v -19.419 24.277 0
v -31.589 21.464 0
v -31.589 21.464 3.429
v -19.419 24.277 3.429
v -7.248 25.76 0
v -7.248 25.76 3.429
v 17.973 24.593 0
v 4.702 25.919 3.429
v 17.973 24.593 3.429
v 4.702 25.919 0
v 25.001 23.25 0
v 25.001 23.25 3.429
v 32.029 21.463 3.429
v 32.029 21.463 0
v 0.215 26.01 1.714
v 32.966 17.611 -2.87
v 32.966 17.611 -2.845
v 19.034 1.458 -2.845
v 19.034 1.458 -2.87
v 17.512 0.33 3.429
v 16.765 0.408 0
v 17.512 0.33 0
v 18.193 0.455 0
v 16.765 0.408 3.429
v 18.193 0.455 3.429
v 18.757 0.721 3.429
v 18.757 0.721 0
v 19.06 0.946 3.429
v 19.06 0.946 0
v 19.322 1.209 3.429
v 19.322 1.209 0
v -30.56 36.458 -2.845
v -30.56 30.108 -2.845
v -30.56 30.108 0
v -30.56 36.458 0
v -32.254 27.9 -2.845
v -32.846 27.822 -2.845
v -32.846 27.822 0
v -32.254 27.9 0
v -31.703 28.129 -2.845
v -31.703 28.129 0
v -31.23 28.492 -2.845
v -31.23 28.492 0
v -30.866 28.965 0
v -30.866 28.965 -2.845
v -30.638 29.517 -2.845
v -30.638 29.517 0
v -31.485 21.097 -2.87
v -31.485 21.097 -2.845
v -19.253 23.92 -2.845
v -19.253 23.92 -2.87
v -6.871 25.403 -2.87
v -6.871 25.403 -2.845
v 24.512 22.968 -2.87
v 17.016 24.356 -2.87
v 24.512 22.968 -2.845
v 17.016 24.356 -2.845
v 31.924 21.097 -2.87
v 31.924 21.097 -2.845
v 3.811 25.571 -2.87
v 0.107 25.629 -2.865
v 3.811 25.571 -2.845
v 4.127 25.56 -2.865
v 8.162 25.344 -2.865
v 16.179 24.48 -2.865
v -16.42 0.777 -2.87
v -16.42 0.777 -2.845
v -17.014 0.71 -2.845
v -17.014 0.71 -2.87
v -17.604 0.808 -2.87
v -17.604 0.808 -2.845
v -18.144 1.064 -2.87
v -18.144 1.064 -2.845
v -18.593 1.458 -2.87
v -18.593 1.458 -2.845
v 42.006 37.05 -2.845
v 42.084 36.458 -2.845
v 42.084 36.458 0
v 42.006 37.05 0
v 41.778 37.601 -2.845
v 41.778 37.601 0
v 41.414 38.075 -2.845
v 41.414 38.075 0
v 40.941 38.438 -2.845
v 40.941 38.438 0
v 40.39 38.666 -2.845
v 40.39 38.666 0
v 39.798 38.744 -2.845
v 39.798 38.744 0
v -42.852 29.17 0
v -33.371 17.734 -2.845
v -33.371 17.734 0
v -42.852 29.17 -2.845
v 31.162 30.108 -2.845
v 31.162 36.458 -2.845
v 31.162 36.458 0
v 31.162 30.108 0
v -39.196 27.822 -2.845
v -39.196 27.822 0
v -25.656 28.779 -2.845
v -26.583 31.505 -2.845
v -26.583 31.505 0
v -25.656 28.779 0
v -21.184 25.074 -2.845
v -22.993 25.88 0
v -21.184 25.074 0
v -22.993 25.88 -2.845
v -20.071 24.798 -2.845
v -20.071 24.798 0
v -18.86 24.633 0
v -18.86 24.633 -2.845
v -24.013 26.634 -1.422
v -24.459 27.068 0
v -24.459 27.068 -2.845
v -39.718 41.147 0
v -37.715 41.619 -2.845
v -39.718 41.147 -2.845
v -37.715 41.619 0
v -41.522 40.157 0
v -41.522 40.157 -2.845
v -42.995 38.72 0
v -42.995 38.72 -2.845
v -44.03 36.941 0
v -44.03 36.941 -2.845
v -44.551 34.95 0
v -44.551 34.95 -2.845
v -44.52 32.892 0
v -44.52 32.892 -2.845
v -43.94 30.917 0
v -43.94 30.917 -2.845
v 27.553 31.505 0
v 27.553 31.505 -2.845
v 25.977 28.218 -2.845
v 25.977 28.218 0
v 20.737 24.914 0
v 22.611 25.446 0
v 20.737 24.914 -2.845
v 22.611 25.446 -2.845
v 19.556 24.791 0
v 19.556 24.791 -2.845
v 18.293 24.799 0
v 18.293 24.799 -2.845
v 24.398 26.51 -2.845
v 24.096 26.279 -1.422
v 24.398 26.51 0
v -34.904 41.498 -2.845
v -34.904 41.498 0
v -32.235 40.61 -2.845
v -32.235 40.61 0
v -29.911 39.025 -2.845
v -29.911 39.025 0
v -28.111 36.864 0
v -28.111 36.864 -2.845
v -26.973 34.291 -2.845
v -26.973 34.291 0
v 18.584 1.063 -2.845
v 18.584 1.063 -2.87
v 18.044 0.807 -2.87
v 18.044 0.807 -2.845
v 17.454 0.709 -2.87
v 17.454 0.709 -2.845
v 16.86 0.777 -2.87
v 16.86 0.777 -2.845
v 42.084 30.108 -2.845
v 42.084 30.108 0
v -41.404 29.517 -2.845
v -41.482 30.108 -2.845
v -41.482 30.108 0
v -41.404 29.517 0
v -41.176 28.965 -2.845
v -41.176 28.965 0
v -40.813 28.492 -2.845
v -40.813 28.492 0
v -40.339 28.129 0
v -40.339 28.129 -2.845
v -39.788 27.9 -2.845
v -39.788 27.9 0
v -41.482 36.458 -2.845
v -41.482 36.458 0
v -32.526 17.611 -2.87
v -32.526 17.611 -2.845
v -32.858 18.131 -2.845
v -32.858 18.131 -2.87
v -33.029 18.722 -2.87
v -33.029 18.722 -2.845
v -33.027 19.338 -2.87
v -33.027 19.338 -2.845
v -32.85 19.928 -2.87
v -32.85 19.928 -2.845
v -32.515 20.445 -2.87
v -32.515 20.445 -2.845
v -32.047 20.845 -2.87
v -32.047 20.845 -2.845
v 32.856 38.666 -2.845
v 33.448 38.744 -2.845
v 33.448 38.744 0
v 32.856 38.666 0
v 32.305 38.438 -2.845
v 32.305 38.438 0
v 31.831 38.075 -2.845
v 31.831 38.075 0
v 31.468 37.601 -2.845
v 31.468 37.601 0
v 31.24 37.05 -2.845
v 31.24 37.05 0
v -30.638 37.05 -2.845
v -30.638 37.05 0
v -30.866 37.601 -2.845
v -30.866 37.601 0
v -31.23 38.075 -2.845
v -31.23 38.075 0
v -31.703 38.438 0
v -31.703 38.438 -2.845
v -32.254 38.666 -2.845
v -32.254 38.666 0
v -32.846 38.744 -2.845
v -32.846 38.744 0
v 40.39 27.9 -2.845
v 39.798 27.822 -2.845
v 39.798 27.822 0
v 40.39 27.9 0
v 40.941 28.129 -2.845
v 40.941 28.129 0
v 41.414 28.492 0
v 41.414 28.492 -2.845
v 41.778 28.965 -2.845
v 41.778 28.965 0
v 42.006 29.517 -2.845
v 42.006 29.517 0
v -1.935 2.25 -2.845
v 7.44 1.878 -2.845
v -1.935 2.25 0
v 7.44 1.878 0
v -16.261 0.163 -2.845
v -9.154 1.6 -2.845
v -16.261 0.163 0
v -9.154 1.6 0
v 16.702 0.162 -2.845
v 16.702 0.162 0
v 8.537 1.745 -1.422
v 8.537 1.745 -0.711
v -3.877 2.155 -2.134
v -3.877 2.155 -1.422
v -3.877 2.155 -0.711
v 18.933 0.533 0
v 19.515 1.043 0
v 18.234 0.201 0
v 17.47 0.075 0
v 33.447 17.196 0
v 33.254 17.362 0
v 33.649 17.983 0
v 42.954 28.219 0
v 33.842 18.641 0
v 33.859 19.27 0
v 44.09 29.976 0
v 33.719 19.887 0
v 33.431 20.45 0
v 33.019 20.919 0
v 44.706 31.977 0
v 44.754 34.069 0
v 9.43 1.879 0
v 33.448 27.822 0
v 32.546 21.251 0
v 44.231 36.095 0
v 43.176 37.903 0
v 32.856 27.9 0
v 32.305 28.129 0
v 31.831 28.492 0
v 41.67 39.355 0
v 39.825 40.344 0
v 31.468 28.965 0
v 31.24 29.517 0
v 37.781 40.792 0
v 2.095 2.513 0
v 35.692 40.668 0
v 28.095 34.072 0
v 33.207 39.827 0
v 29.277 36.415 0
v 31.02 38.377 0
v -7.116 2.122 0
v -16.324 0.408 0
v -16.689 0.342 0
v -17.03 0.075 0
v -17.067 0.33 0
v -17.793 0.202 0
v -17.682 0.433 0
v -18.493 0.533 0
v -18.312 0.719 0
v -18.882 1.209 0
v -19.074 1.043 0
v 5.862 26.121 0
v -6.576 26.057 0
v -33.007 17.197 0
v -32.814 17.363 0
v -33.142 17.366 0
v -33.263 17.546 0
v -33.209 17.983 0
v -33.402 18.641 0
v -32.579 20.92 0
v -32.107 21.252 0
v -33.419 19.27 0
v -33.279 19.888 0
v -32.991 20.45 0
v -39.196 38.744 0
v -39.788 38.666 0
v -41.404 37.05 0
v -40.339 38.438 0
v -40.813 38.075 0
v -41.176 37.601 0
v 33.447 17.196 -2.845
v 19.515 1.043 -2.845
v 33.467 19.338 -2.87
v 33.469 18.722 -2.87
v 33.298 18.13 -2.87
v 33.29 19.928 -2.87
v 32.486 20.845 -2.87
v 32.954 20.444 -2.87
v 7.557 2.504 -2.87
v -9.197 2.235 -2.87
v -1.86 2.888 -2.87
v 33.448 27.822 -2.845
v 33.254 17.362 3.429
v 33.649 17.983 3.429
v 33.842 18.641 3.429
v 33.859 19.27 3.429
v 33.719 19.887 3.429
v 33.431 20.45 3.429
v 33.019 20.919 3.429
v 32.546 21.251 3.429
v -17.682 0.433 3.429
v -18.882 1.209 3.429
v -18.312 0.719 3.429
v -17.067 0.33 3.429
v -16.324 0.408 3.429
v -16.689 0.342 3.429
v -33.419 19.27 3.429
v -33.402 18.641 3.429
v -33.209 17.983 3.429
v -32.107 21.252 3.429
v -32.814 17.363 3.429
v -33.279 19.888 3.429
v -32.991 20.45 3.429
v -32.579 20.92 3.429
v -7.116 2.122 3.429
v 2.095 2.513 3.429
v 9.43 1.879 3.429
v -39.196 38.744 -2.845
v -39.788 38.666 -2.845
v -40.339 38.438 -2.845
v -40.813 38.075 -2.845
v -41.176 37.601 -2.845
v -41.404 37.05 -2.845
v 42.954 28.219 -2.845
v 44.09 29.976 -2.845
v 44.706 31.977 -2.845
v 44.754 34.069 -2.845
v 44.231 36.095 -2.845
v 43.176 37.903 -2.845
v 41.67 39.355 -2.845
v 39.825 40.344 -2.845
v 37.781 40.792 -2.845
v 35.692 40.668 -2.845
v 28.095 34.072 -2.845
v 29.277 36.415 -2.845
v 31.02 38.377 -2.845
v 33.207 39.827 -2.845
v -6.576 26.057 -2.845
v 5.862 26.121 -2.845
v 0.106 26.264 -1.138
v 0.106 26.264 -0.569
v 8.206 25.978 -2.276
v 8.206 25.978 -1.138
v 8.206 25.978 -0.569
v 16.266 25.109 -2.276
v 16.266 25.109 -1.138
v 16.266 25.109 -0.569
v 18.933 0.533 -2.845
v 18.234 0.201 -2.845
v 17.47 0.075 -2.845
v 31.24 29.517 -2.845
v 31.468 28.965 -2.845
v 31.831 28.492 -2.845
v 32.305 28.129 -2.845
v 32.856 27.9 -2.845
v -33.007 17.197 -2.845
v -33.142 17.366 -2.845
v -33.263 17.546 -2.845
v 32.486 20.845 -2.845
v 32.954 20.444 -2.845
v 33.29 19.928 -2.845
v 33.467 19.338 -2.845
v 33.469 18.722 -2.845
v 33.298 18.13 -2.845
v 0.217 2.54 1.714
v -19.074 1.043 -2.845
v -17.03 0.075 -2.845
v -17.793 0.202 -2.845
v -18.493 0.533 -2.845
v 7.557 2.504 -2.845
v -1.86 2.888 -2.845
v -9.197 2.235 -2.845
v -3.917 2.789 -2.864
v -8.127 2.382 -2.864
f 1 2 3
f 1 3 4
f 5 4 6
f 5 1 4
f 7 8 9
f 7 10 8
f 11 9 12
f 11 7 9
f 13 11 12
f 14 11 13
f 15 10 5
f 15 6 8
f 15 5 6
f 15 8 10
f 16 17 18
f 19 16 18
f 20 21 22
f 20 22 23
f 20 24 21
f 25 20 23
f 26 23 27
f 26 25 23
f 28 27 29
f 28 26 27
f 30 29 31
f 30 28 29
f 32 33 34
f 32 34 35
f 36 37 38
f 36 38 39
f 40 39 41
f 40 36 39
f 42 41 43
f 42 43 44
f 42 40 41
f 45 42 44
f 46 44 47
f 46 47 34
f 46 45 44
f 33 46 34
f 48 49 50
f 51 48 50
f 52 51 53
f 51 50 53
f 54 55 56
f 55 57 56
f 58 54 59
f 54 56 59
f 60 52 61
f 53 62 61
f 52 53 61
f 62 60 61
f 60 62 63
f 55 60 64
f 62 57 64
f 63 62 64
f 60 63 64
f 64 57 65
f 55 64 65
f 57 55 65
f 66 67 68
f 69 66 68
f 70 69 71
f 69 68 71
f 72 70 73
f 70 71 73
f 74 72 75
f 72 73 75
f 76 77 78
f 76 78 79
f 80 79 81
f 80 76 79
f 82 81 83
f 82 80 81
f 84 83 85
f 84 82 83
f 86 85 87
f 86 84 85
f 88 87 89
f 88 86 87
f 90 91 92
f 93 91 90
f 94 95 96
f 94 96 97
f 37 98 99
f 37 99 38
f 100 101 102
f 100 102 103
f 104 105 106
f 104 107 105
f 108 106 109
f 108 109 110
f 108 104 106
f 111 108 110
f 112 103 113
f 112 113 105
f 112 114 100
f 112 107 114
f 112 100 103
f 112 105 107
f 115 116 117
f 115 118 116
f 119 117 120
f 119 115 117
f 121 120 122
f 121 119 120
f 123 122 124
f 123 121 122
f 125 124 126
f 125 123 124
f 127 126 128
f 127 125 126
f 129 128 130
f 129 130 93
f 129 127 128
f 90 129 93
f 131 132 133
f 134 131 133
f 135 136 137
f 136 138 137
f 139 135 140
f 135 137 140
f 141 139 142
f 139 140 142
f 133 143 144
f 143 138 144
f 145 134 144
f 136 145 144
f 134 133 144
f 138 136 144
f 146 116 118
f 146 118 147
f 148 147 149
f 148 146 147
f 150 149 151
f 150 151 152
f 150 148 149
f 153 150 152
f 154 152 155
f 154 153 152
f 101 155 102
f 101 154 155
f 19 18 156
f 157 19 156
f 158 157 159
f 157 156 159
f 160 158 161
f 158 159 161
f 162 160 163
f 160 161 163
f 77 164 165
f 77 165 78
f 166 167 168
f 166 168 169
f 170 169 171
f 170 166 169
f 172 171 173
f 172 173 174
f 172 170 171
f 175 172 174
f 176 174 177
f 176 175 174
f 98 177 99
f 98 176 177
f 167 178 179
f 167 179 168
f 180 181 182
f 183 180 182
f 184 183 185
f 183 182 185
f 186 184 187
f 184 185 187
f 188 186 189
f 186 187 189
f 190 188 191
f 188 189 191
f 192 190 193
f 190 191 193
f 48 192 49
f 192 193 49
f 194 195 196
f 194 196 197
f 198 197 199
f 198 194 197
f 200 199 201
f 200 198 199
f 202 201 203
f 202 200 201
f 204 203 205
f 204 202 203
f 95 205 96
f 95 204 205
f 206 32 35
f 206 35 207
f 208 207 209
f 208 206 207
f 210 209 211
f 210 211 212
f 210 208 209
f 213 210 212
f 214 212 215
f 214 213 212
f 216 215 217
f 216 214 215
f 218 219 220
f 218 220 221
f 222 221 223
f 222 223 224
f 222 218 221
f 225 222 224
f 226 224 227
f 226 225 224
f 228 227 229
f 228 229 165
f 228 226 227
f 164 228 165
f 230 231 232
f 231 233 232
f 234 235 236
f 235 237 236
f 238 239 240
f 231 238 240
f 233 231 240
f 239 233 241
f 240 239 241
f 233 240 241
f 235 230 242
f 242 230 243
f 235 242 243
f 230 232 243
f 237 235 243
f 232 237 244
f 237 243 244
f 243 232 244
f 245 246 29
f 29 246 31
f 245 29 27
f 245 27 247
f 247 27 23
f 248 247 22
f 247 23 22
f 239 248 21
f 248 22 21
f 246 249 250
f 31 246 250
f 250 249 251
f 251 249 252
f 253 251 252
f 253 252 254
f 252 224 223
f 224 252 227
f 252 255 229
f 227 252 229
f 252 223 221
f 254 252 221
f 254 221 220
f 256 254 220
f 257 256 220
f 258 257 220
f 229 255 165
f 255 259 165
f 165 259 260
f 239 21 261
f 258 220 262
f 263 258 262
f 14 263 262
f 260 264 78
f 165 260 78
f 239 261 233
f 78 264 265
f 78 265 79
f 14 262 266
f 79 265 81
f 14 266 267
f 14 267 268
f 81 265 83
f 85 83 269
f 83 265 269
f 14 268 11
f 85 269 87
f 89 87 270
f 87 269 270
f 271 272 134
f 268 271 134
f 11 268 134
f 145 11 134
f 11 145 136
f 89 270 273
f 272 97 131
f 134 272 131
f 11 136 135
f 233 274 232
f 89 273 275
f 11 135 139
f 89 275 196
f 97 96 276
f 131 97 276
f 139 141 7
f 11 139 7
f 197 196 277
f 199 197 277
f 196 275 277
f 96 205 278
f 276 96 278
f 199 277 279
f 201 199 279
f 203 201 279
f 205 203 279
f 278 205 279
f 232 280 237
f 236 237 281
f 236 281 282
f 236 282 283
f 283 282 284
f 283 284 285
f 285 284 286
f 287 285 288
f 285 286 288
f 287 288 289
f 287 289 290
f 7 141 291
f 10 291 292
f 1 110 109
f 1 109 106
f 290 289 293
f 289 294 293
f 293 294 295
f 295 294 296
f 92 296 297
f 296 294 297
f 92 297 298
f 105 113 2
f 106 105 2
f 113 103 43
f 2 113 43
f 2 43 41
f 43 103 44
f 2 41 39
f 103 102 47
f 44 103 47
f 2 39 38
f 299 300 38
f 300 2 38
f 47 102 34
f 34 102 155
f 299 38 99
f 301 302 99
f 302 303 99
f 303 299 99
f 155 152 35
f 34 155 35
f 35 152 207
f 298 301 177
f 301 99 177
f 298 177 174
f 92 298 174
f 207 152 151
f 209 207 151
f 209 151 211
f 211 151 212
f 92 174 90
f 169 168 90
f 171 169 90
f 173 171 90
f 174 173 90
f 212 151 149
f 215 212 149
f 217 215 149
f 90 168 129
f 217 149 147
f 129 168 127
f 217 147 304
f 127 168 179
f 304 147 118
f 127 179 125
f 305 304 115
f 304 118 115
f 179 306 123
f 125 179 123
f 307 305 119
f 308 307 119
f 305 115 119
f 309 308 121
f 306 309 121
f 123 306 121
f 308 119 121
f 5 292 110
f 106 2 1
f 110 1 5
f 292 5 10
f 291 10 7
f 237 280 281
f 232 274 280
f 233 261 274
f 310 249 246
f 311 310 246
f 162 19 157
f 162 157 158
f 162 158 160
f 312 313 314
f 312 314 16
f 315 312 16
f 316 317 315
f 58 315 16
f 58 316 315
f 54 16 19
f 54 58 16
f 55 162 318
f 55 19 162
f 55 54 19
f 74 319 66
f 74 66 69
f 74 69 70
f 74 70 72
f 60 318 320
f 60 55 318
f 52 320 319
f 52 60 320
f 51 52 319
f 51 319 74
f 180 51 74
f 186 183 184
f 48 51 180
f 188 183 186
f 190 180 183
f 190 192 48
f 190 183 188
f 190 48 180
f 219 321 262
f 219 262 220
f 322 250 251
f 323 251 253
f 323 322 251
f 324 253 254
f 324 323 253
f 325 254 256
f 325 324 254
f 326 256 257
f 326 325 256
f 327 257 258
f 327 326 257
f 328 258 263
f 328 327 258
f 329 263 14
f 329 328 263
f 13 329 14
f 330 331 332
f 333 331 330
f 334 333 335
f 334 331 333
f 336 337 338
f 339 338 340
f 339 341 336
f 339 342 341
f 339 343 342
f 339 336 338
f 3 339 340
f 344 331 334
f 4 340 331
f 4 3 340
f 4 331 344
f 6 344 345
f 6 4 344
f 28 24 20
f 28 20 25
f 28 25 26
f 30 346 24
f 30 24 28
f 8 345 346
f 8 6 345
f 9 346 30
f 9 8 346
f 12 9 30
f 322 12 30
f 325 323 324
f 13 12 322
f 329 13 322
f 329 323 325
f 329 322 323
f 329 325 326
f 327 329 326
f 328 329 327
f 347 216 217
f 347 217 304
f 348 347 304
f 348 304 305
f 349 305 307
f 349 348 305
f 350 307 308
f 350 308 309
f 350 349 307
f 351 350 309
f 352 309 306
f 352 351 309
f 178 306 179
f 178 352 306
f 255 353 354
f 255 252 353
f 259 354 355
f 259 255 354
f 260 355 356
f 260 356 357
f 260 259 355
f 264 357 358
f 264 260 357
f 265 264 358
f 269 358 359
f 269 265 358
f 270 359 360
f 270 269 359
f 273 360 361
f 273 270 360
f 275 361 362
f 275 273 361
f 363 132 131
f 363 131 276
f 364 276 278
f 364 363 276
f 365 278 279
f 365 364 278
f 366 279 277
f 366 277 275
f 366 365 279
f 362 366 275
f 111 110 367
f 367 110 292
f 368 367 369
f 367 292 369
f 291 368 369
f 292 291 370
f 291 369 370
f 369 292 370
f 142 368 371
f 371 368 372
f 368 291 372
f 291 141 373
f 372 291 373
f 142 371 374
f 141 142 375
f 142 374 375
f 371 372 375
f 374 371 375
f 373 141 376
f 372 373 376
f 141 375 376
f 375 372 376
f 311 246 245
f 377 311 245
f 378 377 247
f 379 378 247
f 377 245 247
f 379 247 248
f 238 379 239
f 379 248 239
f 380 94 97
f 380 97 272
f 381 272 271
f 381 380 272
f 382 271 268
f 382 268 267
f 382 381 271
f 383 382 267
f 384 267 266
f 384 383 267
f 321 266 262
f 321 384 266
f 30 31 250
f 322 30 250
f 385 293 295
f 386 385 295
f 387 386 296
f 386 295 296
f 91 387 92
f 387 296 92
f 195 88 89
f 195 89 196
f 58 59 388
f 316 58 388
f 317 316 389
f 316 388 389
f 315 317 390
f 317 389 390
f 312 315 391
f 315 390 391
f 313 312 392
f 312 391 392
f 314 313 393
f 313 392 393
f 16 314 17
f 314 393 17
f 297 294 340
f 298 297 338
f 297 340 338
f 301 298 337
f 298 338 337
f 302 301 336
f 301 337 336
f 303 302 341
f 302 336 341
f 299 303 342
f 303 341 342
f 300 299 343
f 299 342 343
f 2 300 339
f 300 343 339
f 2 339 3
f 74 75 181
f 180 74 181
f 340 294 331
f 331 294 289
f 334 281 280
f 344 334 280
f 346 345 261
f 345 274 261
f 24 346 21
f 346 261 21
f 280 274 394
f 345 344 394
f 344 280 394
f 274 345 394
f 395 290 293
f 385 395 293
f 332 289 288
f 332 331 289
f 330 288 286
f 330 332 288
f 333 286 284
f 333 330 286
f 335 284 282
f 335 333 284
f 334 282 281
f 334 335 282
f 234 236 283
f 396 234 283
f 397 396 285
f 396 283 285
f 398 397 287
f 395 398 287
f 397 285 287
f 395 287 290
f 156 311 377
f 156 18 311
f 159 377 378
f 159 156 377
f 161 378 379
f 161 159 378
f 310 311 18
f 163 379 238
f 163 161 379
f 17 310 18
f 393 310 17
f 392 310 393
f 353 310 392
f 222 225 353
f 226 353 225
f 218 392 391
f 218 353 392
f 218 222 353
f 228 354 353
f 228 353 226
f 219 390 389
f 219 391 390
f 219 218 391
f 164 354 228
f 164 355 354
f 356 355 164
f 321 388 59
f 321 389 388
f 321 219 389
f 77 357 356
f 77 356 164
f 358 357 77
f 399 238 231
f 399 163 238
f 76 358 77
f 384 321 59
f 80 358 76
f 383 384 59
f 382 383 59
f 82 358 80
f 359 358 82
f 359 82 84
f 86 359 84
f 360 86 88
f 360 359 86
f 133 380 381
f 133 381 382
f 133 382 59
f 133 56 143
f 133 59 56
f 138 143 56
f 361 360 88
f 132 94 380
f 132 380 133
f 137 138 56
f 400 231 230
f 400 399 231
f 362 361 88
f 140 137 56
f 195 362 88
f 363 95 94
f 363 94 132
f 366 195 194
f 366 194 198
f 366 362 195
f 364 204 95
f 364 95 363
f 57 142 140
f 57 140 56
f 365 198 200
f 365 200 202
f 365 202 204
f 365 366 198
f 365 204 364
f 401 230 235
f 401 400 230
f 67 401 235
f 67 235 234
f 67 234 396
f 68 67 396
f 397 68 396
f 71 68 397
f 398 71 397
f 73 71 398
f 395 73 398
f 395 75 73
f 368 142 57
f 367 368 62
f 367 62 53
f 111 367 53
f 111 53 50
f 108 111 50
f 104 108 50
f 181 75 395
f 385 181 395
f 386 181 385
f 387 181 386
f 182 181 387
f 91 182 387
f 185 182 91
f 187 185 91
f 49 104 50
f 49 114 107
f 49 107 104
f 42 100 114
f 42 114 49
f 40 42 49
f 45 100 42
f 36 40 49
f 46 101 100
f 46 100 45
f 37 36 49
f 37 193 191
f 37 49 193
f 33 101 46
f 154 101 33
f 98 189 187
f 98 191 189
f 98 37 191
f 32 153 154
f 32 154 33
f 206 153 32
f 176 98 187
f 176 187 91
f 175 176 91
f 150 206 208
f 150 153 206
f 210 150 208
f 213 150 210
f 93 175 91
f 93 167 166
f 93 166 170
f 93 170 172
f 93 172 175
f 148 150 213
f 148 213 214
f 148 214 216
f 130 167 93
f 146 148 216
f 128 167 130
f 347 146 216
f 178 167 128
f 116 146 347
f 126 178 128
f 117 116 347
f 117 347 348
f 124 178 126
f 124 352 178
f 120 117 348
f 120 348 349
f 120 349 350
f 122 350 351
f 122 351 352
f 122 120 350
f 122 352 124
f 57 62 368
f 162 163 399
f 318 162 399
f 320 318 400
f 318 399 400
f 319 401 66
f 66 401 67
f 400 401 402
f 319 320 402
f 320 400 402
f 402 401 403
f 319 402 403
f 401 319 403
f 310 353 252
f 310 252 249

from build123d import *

# Parameters (mm, degrees)
BOSS_EXTRUDE1_DEPTH = 3.429
FILLET1_R           = 2.54
BOSS_EXTRUDE2_DEPTH = 2.8448
BOSS_EXTRUDE3_DEPTH = 2.8448
FILLET2_R           = 7.62
CUT_EXTRUDE1_DEPTH  = 2.8448
BOSS_EXTRUDE4_DEPTH = 2.8448
CUT_EXTRUDE2_DEPTH  = 2.8448
FILLET3_R           = 7.62
BOSS_EXTRUDE5_DEPTH = 0.0254


with BuildPart() as part:
    # Sketch1 → Boss-Extrude1 (new body)
    with BuildSketch(Plane.XY):
        with BuildLine():
            Line((-35.365163415, 20.32), (-17.839163415, 0))
            add(Edge.make_bspline(
                [(-17.839163415, 0), (0.211689908, 5.080726576), (18.279636585, 0)],
                knots=[0, 0, 0, 1, 1, 1], degree=2))
            Line((18.279636585, 0), (35.805636585, 20.32))
            add(Edge.make_bspline(
                [(-35.365163415, 20.32), (0.209256434, 31.699614416), (35.805636585, 20.32)],
                knots=[0, 0, 0, 1, 1, 1], degree=2))
        make_face()
    extrude(amount=BOSS_EXTRUDE1_DEPTH)

    # Fillet1
    fillet1_edges = [part.edges().sort_by_distance(p)[0] for p in [
        (18.279636585, 0, 1.7145),
        (35.805636585, 20.32, 1.7145),
        (-17.839163415, 0, 1.7145),
        (-35.365163415, 20.32, 1.7145),
    ]]
    fillet(fillet1_edges, radius=FILLET1_R)

    # Sketch3 → Boss-Extrude2 (add)
    with BuildSketch(Plane(origin=(0, 0, 0), x_dir=(-1, 0, 0), z_dir=(0, 0, -1))):
        with BuildLine():
            Line((-33.44681638, 17.196237572), (-19.51455408, 1.042889978))
            ThreePointArc((-19.51455408, 1.042889978), (-18.233735028, 0.201395136), (-16.701721503, 0.162081334))
            add(Edge.make_bspline(
                [(-16.701721503, 0.162081334), (-11.287416328, 1.557018557), (-5.815998288, 2.280480011), (1.099570731, 2.287789464), (2.486501294, 2.244377729), (5.268126494, 2.066272068), (6.66342146, 1.931190975), (10.814897092, 1.394504939), (13.552184291, 0.860935066), (16.260993662, 0.162500978)],
                knots=[0, 0, 0, 0, 0.5, 0.5, 0.625, 0.625, 0.75, 0.75, 1, 1, 1, 1], degree=3))
            ThreePointArc((16.260993662, 0.162500978), (17.793263077, 0.201606931), (19.074330708, 1.043179601))
            Line((19.074330708, 1.043179601), (33.006779663, 17.196743606))
            ThreePointArc((33.006779663, 17.196743606), (33.568121111, 19.821332934), (31.659110958, 21.707931354))
            add(Edge.make_bspline(
                [(31.659110958, 21.707931354), (21.234977833, 24.688407586), (10.651761037, 26.253278411), (-1.450873571, 26.265063816), (-2.798343422, 26.242056629), (-5.498815234, 26.146814801), (-6.854115547, 26.074394022), (-10.909317669, 25.783877715), (-13.59595314, 25.493149433), (-21.607199162, 24.340406402), (-26.883182271, 23.198023422), (-32.098788298, 21.707528048)],
                knots=[0, 0, 0, 0, 0.5, 0.5, 0.5625, 0.5625, 0.625, 0.625, 0.75, 0.75, 1, 1, 1, 1], degree=3))
            ThreePointArc((-32.098788298, 21.707528048), (-34.008104328, 19.821005964), (-33.44681638, 17.196237572))
        make_face()
    extrude(amount=BOSS_EXTRUDE2_DEPTH)

    # Sketch6 → Boss-Extrude3 (add)
    with BuildSketch(Plane(origin=(0, 0, -2.8448), x_dir=(-1, 0, 0), z_dir=(0, 0, -1))):
        with BuildLine():
            Line((18.860011299, 24.632736939), (22.773121111, 23.894535093))
            Line((22.773121111, 23.894535093), (30.902144608, 14.756587021))
            Line((30.902144608, 14.756587021), (46.651415509, 33.752843138))
            ThreePointArc((46.651415509, 33.752843138), (35.612340647, 41.602210449), (26.583121111, 31.505332934))
            add(Edge.make_bspline(
                [(26.583121111, 31.505332934), (25.303985062, 25.198624265), (18.860011299, 24.632736939)],
                knots=[0, 0, 0, 1, 1, 1], degree=2))
        make_face()
    extrude(amount=-BOSS_EXTRUDE3_DEPTH)

    # Fillet2
    fillet2_edges = [part.edges().sort_by_distance(p)[0] for p in [
        (-46.651415509, 33.752843138, -1.4224),
    ]]
    fillet(fillet2_edges, radius=FILLET2_R)

    # Sketch8 → Cut-Extrude1 (cut)
    with BuildSketch(Plane(origin=(0, 0, -2.8448), x_dir=(-1, 0, 0), z_dir=(0, 0, -1))):
        with BuildLine():
            Line((32.846126677, 38.744332934), (39.196126677, 38.744332934))
            ThreePointArc((39.196126677, 38.744332934), (40.812572779, 38.074779036), (41.482126677, 36.458332934))
            Line((41.482126677, 36.458332934), (41.482126677, 30.108332934))
            ThreePointArc((41.482126677, 30.108332934), (40.812572779, 28.491886832), (39.196126677, 27.822332934))
            Line((39.196126677, 27.822332934), (32.846126677, 27.822332934))
            ThreePointArc((32.846126677, 27.822332934), (31.229680575, 28.491886832), (30.560126677, 30.108332934))
            Line((30.560126677, 30.108332934), (30.560126677, 36.458332934))
            ThreePointArc((30.560126677, 36.458332934), (31.229680575, 38.074779036), (32.846126677, 38.744332934))
        make_face()
    extrude(amount=-CUT_EXTRUDE1_DEPTH, mode=Mode.SUBTRACT)

    # Sketch9 → Boss-Extrude4 (add)
    with BuildSketch(Plane(origin=(0, 0, -2.8448), x_dir=(-1, 0, 0), z_dir=(0, 0, -1))):
        with BuildLine():
            Line((-47.463840908, 33.447860213), (-33.44681638, 17.196237572))
            Line((-33.44681638, 17.196237572), (-23.253298607, 23.884814358))
            Line((-23.253298607, 23.884814358), (-18.292818846, 24.798887742))
            add(Edge.make_bspline(
                [(-27.552629507, 31.505332934), (-25.268328972, 24.405957798), (-18.292818846, 24.798887742)],
                knots=[0, 0, 0, 1, 1, 1], degree=2))
            ThreePointArc((-27.552629507, 31.505332934), (-36.694543436, 40.817065736), (-47.463840908, 33.447860213))
        make_face()
    extrude(amount=-BOSS_EXTRUDE4_DEPTH)

    # Sketch10 → Cut-Extrude2 (cut)
    with BuildSketch(Plane(origin=(0, 0, -2.8448), x_dir=(-1, 0, 0), z_dir=(0, 0, -1))):
        with BuildLine():
            Line((-39.797873323, 38.744332934), (-33.447873323, 38.744332934))
            ThreePointArc((-33.447873323, 38.744332934), (-31.831427221, 38.074779036), (-31.161873323, 36.458332934))
            Line((-31.161873323, 36.458332934), (-31.161873323, 30.108332934))
            ThreePointArc((-31.161873323, 30.108332934), (-31.831427221, 28.491886832), (-33.447873323, 27.822332934))
            Line((-33.447873323, 27.822332934), (-39.797873323, 27.822332934))
            ThreePointArc((-39.797873323, 27.822332934), (-41.414319425, 28.491886832), (-42.083873323, 30.108332934))
            Line((-42.083873323, 30.108332934), (-42.083873323, 36.458332934))
            ThreePointArc((-42.083873323, 36.458332934), (-41.414319425, 38.074779036), (-39.797873323, 38.744332934))
        make_face()
    extrude(amount=-CUT_EXTRUDE2_DEPTH, mode=Mode.SUBTRACT)

    # Fillet3
    fillet3_edges = [part.edges().sort_by_distance(p)[0] for p in [
        (47.463840908, 33.447860213, -1.4224),
    ]]
    fillet(fillet3_edges, radius=FILLET3_R)

    # Sketch11 → Boss-Extrude5 (add)
    with BuildSketch(Plane(origin=(0, 0, -2.8448), x_dir=(-1, 0, 0), z_dir=(0, 0, -1))):
        with BuildLine():
            Line((-32.96596357, 17.610973121), (-19.03370127, 1.457625527))
            ThreePointArc((-19.03370127, 1.457625527), (-18.043977457, 0.807379512), (-16.860148825, 0.777000665))
            add(Edge.make_bspline(
                [(-16.860148825, 0.777000665), (-11.393767532, 2.185354737), (-5.869704309, 2.915437473), (1.112358732, 2.922799867), (2.512622955, 2.878981915), (5.320986764, 2.699211385), (6.729692814, 2.562868028), (10.921080204, 2.021141726), (13.684690054, 1.482537974), (16.419535692, 0.777390745)],
                knots=[0, 0, 0, 0, 0.5, 0.5, 0.625, 0.625, 0.75, 0.75, 1, 1, 1, 1], degree=3))
            ThreePointArc((16.419535692, 0.777390745), (17.603562029, 0.807609004), (18.593477899, 1.457915149))
            Line((18.593477899, 1.457915149), (32.525926853, 17.611479154))
            ThreePointArc((32.525926853, 17.611479154), (32.9596907, 19.639570906), (31.484546495, 21.097396958))
            add(Edge.make_bspline(
                [(31.484546495, 21.097396958), (21.117495606, 24.061552194), (10.592269896, 25.618335787), (-1.444129852, 25.63005698), (-2.78422621, 25.607170327), (-5.469922522, 25.512428381), (-6.817808951, 25.44038787), (-10.850823746, 25.151400244), (-13.522755051, 24.862204706), (-21.490147902, 23.715583367), (-26.737240722, 22.579309276), (-31.924305501, 21.096970308)],
                knots=[0, 0, 0, 0, 0.5, 0.5, 0.5625, 0.5625, 0.625, 0.625, 0.75, 0.75, 1, 1, 1, 1], degree=3))
            ThreePointArc((-31.924305501, 21.096970308), (-33.399686074, 19.639203245), (-32.96596357, 17.610973121))
        make_face()
    extrude(amount=BOSS_EXTRUDE5_DEPTH)


solid = part.part
